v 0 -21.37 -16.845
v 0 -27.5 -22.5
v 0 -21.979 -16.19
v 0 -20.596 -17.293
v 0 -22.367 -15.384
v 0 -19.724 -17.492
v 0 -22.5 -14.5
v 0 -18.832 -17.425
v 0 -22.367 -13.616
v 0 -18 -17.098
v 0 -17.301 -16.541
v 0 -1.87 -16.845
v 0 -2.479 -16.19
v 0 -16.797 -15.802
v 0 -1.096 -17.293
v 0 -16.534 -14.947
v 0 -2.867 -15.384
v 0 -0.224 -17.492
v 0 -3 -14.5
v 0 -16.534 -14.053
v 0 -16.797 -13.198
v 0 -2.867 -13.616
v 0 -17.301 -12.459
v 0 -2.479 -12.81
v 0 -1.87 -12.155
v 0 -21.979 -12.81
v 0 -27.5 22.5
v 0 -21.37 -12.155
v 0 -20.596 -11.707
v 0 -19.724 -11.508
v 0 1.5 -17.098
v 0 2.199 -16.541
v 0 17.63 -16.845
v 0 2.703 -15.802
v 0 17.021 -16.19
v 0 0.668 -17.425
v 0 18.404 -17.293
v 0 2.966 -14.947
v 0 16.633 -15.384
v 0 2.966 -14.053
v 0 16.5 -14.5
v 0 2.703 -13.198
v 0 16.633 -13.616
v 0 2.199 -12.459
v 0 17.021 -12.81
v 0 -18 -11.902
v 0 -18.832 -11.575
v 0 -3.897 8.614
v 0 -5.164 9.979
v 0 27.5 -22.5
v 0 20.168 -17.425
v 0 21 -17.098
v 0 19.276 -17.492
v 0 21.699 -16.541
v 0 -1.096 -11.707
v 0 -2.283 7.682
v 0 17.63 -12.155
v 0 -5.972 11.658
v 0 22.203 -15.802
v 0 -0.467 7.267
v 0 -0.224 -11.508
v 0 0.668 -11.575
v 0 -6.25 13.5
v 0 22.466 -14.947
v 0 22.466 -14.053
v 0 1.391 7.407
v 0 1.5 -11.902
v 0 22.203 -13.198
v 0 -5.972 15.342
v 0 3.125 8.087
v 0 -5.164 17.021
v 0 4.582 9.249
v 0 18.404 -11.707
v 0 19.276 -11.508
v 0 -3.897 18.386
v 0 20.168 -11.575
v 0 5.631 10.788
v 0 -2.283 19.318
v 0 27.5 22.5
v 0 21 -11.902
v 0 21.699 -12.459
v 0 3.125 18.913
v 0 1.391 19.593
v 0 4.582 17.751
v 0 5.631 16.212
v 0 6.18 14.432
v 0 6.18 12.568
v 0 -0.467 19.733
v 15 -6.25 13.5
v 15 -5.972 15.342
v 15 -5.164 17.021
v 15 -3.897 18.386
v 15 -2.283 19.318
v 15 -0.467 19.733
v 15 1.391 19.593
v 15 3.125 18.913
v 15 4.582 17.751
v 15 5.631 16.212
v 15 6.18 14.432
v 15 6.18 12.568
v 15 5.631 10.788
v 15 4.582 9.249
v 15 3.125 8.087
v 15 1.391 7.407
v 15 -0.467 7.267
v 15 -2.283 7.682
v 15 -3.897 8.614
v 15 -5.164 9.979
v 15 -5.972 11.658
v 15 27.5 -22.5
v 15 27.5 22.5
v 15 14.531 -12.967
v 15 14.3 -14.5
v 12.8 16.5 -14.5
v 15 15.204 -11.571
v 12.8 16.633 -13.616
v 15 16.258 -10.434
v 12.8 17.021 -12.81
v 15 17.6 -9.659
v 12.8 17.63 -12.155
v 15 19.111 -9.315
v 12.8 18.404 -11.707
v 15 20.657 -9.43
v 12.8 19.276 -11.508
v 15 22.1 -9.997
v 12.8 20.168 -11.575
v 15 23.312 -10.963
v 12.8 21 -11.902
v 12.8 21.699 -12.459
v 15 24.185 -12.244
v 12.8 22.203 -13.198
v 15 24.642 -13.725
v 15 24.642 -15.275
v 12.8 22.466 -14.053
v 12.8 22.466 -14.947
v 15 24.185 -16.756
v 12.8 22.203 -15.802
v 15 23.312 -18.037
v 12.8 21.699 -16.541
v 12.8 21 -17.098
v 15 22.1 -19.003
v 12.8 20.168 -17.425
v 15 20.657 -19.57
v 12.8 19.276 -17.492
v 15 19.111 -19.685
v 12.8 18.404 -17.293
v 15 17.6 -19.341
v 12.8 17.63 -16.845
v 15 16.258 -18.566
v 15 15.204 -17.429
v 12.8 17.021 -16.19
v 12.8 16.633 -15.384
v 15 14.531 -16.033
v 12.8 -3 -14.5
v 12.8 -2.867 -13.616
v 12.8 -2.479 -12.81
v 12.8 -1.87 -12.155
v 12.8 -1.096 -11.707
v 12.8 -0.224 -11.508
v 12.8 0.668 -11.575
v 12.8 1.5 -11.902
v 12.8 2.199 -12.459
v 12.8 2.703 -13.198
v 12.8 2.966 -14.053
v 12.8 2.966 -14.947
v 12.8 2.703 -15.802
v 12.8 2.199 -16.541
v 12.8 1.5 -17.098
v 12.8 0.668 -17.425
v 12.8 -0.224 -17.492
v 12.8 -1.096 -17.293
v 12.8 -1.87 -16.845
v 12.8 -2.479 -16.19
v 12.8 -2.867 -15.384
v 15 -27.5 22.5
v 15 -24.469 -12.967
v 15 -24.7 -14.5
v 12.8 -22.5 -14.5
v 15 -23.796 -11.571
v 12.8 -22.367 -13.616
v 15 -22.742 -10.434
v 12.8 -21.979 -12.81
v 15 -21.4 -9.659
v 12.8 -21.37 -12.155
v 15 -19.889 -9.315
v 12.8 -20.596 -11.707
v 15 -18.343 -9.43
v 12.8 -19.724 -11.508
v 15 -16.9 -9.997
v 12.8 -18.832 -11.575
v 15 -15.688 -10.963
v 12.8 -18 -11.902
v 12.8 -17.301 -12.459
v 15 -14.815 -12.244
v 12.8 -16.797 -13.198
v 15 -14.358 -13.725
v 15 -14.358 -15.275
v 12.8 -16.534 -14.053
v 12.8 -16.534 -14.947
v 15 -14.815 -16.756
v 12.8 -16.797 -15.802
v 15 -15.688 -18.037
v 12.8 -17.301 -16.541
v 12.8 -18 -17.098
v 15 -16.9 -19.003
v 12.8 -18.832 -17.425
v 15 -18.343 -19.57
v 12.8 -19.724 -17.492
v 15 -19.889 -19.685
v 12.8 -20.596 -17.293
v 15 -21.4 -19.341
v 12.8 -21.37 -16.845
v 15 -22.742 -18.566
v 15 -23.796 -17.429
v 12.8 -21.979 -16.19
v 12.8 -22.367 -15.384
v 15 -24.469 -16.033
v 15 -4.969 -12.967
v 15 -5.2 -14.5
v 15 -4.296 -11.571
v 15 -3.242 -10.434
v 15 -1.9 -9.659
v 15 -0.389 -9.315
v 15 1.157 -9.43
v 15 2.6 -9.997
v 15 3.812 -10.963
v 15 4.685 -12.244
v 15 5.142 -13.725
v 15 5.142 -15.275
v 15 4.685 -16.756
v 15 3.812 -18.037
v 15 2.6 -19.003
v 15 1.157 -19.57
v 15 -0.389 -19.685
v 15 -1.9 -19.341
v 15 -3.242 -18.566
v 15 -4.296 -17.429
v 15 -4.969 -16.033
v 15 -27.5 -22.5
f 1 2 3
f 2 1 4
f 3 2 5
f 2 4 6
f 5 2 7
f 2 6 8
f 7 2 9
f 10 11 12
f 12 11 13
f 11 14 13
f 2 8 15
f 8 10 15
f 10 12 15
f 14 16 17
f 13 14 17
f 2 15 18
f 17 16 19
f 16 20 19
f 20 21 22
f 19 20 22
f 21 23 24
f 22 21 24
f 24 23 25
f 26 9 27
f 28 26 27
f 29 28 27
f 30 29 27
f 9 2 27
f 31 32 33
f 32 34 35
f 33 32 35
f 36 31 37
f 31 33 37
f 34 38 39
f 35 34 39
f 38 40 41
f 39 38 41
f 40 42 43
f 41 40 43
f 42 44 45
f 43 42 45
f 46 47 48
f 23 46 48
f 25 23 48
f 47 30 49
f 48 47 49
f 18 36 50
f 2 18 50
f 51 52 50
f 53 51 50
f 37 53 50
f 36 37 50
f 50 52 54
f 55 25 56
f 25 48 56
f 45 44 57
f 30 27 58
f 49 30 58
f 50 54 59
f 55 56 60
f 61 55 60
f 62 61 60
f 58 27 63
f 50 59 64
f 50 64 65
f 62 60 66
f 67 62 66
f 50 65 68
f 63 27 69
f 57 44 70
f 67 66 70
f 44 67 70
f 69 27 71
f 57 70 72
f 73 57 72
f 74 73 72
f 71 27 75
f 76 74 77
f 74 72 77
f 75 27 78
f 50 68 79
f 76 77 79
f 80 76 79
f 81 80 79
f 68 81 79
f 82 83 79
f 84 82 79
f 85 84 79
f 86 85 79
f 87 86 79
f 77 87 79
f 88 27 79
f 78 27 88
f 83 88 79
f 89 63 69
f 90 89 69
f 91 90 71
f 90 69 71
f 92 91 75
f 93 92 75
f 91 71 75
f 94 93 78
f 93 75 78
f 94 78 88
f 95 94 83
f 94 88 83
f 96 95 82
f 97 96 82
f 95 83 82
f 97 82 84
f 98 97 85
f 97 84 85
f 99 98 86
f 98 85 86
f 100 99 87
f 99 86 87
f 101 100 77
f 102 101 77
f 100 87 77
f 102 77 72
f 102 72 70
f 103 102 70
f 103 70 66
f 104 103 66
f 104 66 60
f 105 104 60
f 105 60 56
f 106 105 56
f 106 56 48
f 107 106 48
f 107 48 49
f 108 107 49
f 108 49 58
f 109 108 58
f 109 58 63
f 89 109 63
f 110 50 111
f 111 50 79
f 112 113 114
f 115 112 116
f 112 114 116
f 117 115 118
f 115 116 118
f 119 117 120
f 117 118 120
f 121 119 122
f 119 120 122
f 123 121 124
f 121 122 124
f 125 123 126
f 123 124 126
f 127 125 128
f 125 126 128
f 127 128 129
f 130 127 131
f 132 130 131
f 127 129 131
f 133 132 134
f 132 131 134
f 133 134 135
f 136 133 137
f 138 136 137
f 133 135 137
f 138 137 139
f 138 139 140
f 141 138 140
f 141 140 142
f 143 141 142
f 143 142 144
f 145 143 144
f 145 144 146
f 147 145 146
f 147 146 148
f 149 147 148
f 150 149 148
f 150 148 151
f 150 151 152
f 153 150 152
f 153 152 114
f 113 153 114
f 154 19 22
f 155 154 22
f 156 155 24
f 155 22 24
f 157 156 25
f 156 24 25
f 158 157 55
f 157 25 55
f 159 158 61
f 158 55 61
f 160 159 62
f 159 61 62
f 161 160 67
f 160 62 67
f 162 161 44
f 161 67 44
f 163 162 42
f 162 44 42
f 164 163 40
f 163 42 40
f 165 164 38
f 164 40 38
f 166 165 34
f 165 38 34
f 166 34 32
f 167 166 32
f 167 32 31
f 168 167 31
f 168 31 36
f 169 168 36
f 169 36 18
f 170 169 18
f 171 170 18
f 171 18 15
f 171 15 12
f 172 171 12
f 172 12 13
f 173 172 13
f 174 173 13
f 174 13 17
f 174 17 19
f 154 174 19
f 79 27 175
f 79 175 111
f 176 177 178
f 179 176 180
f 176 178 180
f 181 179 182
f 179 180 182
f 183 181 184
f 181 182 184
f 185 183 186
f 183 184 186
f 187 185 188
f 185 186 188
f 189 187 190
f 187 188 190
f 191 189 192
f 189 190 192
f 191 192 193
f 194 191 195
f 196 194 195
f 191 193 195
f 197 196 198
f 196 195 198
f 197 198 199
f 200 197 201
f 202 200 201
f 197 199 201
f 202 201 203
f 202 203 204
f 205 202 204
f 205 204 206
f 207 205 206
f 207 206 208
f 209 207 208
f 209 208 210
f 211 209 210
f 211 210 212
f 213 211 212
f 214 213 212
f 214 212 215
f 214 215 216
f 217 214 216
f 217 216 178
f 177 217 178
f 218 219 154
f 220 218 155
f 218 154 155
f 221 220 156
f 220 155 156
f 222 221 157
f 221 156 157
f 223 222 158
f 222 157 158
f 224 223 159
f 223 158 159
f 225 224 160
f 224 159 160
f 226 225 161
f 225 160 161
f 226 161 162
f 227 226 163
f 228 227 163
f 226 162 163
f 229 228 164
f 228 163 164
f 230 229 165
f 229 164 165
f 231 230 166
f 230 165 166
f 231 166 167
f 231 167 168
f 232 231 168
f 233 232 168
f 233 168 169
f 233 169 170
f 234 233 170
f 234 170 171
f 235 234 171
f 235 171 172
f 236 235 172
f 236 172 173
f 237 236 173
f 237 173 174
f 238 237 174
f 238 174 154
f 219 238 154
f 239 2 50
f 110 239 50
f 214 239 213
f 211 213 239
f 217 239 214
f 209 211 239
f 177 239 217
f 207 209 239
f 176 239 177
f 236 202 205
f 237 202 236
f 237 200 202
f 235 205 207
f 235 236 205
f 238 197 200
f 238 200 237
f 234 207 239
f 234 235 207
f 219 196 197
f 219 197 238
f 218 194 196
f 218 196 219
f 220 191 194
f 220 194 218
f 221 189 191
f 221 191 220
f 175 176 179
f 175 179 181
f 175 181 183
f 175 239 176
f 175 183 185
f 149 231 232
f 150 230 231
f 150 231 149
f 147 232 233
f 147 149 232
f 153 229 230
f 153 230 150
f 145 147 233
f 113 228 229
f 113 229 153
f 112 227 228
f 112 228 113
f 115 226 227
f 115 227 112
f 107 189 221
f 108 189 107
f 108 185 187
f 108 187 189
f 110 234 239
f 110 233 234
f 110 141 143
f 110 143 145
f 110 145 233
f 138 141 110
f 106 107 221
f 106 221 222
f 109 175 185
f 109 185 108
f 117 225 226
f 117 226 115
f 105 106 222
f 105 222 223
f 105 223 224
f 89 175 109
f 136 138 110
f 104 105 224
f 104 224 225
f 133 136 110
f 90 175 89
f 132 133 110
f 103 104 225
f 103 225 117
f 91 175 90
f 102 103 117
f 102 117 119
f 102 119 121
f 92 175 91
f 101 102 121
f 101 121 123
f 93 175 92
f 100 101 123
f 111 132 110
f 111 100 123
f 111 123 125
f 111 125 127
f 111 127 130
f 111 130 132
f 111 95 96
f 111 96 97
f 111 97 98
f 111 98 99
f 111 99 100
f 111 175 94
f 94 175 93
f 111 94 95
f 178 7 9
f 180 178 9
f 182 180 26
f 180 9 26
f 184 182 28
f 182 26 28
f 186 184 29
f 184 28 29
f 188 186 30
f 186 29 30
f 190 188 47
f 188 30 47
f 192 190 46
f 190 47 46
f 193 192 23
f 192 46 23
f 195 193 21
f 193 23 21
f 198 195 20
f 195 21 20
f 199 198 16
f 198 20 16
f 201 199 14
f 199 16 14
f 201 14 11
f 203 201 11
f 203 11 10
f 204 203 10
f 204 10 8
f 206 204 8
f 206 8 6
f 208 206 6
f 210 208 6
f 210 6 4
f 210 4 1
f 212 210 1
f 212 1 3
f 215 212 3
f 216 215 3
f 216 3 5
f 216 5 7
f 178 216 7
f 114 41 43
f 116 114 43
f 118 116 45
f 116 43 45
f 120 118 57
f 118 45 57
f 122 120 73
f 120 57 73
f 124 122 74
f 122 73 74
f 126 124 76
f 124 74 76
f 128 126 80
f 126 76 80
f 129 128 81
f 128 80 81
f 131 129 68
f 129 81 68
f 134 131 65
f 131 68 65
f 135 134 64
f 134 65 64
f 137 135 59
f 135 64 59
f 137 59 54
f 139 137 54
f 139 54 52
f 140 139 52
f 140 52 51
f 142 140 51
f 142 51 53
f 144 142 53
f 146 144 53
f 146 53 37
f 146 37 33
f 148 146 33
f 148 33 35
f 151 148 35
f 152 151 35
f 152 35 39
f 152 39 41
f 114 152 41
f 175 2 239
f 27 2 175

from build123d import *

# Parameters (mm, degrees)
F0_W           = 55
F0_H           = 45
F1_DEPTH       = 15
F3_D           = 12.5
F3_DEPTH       = 15
F4_D           = 6
F4_DEPTH       = 15
F4_CSINK_D     = 10.4
F4_CSINK_ANGLE = 90


with BuildPart() as f1:
    # F0 (on Right) → F1 (new body)
    with BuildSketch(Plane.YZ):
        Rectangle(F0_W, F0_H)
    extrude(amount=F1_DEPTH)

    # F3
    with Locations(Plane.YZ.offset(15)):
        with Locations((0, 13.5)):
            Hole(F3_D / 2, depth=F3_DEPTH)

    # F4
    with Locations(Plane.YZ.offset(15)):
        with Locations((-19.5, -14.5), (0, -14.5), (19.5, -14.5)):
            CounterSinkHole(F4_D / 2, F4_CSINK_D / 2, depth=F4_DEPTH, counter_sink_angle=F4_CSINK_ANGLE)


solid = f1.part
